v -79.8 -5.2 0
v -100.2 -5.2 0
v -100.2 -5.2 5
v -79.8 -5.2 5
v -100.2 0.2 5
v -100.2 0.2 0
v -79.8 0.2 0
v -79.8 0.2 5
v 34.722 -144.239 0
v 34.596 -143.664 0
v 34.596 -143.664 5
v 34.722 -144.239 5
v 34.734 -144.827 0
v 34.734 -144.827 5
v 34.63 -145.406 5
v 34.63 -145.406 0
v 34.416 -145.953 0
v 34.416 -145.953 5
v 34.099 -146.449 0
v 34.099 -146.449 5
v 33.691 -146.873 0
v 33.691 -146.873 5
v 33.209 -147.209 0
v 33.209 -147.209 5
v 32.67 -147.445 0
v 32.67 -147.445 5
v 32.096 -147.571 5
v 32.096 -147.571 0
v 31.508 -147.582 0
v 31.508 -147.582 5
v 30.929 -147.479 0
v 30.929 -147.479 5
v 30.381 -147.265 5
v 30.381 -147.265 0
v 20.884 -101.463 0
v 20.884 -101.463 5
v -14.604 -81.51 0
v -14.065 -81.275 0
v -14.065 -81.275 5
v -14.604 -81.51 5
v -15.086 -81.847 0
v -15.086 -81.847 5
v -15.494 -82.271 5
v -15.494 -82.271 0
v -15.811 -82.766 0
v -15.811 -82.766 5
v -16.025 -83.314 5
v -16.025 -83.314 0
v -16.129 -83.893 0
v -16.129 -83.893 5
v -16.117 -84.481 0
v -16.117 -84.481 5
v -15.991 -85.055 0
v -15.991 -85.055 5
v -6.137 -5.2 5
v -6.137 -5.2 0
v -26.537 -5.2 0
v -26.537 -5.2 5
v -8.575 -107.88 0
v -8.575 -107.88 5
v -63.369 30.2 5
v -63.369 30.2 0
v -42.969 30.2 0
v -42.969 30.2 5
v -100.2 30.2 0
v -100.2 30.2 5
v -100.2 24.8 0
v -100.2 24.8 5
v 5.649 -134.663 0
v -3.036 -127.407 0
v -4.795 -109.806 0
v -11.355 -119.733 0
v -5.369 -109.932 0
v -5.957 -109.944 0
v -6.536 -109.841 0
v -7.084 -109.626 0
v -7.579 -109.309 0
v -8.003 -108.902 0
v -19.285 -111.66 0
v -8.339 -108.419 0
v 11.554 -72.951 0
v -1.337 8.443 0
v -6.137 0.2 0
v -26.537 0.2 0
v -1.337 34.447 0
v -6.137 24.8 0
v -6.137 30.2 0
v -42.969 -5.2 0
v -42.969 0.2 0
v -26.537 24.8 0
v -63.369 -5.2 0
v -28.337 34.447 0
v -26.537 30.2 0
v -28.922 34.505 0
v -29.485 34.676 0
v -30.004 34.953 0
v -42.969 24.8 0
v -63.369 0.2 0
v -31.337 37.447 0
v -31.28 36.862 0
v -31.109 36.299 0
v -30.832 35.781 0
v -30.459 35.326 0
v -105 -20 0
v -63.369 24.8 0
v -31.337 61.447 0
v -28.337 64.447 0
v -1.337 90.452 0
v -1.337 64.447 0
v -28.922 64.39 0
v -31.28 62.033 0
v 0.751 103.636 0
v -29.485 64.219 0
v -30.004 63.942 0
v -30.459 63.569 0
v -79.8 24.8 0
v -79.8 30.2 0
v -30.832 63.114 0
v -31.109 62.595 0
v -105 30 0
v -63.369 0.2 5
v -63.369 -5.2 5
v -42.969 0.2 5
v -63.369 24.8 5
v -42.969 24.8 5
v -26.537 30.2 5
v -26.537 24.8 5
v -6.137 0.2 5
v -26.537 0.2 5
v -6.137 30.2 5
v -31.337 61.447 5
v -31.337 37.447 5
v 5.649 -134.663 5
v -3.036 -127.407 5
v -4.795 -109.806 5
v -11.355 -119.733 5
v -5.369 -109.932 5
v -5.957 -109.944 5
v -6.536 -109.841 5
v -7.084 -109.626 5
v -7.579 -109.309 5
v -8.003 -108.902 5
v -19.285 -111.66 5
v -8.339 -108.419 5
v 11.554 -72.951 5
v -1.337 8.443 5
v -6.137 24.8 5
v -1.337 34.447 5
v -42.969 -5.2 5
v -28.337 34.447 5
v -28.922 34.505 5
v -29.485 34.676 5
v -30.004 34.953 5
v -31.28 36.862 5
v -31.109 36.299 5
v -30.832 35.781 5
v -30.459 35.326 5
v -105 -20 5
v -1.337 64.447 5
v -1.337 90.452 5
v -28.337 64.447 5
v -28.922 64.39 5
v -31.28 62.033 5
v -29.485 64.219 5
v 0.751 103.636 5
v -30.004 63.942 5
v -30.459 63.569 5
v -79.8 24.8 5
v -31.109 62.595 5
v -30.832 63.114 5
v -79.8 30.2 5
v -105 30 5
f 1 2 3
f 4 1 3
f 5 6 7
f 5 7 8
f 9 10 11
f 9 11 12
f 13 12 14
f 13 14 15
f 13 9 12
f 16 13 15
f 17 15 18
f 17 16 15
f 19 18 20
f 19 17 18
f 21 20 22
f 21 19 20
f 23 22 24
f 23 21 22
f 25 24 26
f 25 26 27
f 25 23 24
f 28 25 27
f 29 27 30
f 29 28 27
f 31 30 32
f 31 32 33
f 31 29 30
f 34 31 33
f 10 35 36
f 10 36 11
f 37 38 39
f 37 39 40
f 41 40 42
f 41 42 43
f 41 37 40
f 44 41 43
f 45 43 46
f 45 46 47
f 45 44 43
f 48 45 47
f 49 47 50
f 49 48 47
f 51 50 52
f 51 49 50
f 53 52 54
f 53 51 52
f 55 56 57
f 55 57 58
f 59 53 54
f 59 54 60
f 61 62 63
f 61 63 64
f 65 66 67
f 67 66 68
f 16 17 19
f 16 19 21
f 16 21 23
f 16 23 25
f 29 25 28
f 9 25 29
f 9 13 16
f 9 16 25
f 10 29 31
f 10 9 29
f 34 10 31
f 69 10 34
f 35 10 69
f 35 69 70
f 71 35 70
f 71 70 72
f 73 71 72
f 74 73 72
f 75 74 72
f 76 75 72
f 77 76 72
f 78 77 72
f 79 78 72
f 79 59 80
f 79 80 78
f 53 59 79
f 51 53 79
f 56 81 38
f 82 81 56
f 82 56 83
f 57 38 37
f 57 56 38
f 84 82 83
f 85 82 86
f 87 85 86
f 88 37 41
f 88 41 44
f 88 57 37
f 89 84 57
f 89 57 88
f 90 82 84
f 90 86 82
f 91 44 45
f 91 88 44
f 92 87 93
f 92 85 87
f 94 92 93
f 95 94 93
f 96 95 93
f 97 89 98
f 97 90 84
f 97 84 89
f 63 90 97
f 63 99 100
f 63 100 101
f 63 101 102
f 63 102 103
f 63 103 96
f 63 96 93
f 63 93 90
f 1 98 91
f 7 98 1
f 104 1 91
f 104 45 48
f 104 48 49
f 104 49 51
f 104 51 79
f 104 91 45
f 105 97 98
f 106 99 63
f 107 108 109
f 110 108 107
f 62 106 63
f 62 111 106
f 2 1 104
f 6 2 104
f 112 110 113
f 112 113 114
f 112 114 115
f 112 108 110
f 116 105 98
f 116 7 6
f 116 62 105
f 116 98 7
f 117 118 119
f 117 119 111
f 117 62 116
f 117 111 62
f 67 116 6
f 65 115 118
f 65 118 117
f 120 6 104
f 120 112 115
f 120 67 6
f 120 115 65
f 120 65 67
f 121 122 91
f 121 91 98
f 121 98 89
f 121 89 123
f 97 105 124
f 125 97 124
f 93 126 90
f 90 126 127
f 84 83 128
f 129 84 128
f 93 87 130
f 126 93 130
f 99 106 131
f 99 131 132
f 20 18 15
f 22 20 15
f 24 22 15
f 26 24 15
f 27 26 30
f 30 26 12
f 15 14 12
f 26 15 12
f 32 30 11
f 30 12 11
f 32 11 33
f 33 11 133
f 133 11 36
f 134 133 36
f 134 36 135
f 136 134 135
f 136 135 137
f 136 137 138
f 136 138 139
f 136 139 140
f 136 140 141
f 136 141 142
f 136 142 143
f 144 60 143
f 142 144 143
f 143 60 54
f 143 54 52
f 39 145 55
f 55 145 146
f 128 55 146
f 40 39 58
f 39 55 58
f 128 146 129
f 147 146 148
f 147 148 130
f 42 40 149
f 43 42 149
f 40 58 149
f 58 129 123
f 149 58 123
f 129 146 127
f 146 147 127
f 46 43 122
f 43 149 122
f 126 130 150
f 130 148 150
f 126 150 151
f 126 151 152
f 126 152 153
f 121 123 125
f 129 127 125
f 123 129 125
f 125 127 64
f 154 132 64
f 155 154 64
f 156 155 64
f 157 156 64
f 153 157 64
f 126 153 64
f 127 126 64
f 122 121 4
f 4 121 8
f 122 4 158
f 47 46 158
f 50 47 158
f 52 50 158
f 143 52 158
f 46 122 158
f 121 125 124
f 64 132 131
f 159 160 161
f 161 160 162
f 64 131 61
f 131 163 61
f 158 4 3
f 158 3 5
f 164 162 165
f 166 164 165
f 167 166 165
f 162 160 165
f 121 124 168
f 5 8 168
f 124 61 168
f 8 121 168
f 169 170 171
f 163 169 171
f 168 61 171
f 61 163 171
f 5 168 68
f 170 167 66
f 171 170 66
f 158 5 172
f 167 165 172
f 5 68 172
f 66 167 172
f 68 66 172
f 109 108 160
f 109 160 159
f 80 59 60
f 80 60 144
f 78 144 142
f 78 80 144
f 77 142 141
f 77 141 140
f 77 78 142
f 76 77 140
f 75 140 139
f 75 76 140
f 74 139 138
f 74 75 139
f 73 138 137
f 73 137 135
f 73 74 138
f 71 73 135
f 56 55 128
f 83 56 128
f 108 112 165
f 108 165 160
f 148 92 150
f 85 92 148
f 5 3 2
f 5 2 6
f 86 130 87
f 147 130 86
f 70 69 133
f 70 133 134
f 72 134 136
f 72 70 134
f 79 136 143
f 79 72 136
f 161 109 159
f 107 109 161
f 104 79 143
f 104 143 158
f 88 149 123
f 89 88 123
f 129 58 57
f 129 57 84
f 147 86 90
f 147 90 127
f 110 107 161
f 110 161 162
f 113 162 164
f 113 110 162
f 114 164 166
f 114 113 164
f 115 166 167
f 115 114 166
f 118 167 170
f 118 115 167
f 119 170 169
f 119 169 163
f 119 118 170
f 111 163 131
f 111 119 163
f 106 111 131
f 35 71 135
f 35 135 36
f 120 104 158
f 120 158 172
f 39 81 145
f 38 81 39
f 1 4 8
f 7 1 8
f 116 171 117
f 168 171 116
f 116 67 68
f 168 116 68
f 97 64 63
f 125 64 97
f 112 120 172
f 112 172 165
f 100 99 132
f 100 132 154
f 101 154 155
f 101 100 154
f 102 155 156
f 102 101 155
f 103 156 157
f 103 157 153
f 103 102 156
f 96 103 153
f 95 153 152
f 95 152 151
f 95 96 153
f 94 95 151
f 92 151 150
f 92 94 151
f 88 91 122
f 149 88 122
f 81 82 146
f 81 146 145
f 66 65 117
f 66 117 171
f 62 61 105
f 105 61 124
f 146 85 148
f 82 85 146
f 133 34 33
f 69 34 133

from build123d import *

# Parameters (mm, degrees)
SM_BASE_FLANGE_1_DEPTH = 5
OTHER_START            = -100.2
OTHER_1_OUTLINE_W      = 5.4
OTHER_1_OUTLINE_H      = 5
OTHER_1_DEPTH          = 20.4
OTHER_START_2          = -63.368595269
OTHER_1_2_OUTLINE_W    = 5.4
OTHER_1_2_OUTLINE_H    = 5
OTHER_1_2_DEPTH        = 20.4
OTHER_START_3          = -26.537190538
OTHER_1_3_OUTLINE_W    = 5.4
OTHER_1_3_OUTLINE_H    = 5
OTHER_1_3_DEPTH        = 20.4


# Read off the part's stored shape, not the designer's step: Выступы и прорези-Прорезь1
# Sheet-metal steps are written as plain solids
with BuildPart() as part:
    # Sketch 1 → Базовая кромка1 (new body)
    with BuildSketch(Plane.XY):
        with BuildLine():
            Line((-105, 0), (-105, 30))
            Line((-105, 30), (0.750859603, 103.635517522))
            Line((0.750859603, 103.635517522), (-1.337190538, 90.452087776))
            Line((-1.337190538, 90.452087776), (-1.337190538, 64.447388282))
            Line((-1.337190538, 64.447388282), (-28.337190538, 64.447388282))
            ThreePointArc((-28.337190538, 64.447388282), (-30.458510882, 63.568708625), (-31.337190538, 61.447388282))
            Line((-31.337190538, 61.447388282), (-31.337190538, 37.447388282))
            ThreePointArc((-31.337190538, 37.447388282), (-30.458510882, 35.326067938), (-28.337190538, 34.447388282))
            Line((-28.337190538, 34.447388282), (-1.337190538, 34.447388282))
            Line((-1.337190538, 34.447388282), (-1.337190538, 8.442688787))
            Line((-1.337190538, 8.442688787), (11.55423155, -72.950546947))
            Line((11.55423155, -72.950546947), (-14.065019195, -81.274746116))
            ThreePointArc((-14.065019195, -81.274746116), (-15.810987784, -82.765944166), (-15.991137761, -85.054966648))
            Line((-15.991137761, -85.054966648), (-8.574729896, -107.88032304))
            ThreePointArc((-8.574729896, -107.88032304), (-7.083531846, -109.626291629), (-4.794509364, -109.806441605))
            Line((-4.794509364, -109.806441605), (20.884016576, -101.462982757))
            Line((20.884016576, -101.462982757), (34.59610485, -143.664451098))
            ThreePointArc((34.59610485, -143.664451098), (33.691279446, -146.872719978), (30.380963802, -147.264521653))
            Line((30.380963802, -147.264521653), (5.64897556, -134.662944227))
            ThreePointArc((5.64897556, -134.662944227), (-7.242640853, -123.621288585), (-19.285450277, -111.659571558))
            Line((-19.285450277, -111.659571558), (-105, -20))
            Line((-105, -20), (-105, 0))
        make_face()
    extrude(amount=SM_BASE_FLANGE_1_DEPTH)

    # Other 1 outline → Other 1 (cut)
    with BuildSketch(Plane.YZ.offset(OTHER_START)):
        with Locations((-2.5, 2.5)):
            Rectangle(OTHER_1_OUTLINE_W, OTHER_1_OUTLINE_H)
    other_1 = extrude(amount=OTHER_1_DEPTH, mode=Mode.SUBTRACT)

    # Other 1 2 outline → Other 1 2 (cut)
    with BuildSketch(Plane.YZ.offset(OTHER_START_2)):
        with Locations((-2.5, 2.5)):
            Rectangle(OTHER_1_2_OUTLINE_W, OTHER_1_2_OUTLINE_H)
    other_1_2 = extrude(amount=OTHER_1_2_DEPTH, mode=Mode.SUBTRACT)

    # Other 1 3 outline → Other 1 3 (cut)
    with BuildSketch(Plane.YZ.offset(OTHER_START_3)):
        with Locations((-2.5, 2.5)):
            Rectangle(OTHER_1_3_OUTLINE_W, OTHER_1_3_OUTLINE_H)
    other_1_3 = extrude(amount=OTHER_1_3_DEPTH, mode=Mode.SUBTRACT)

    # Зеркальное отражение1: Other 1, Other 1 2, Other 1 3 across plane
    add(other_1.mirror(Plane.ZX.offset(12.5)), mode=Mode.SUBTRACT)
    add(other_1_2.mirror(Plane.ZX.offset(12.5)), mode=Mode.SUBTRACT)
    add(other_1_3.mirror(Plane.ZX.offset(12.5)), mode=Mode.SUBTRACT)


solid = part.part
